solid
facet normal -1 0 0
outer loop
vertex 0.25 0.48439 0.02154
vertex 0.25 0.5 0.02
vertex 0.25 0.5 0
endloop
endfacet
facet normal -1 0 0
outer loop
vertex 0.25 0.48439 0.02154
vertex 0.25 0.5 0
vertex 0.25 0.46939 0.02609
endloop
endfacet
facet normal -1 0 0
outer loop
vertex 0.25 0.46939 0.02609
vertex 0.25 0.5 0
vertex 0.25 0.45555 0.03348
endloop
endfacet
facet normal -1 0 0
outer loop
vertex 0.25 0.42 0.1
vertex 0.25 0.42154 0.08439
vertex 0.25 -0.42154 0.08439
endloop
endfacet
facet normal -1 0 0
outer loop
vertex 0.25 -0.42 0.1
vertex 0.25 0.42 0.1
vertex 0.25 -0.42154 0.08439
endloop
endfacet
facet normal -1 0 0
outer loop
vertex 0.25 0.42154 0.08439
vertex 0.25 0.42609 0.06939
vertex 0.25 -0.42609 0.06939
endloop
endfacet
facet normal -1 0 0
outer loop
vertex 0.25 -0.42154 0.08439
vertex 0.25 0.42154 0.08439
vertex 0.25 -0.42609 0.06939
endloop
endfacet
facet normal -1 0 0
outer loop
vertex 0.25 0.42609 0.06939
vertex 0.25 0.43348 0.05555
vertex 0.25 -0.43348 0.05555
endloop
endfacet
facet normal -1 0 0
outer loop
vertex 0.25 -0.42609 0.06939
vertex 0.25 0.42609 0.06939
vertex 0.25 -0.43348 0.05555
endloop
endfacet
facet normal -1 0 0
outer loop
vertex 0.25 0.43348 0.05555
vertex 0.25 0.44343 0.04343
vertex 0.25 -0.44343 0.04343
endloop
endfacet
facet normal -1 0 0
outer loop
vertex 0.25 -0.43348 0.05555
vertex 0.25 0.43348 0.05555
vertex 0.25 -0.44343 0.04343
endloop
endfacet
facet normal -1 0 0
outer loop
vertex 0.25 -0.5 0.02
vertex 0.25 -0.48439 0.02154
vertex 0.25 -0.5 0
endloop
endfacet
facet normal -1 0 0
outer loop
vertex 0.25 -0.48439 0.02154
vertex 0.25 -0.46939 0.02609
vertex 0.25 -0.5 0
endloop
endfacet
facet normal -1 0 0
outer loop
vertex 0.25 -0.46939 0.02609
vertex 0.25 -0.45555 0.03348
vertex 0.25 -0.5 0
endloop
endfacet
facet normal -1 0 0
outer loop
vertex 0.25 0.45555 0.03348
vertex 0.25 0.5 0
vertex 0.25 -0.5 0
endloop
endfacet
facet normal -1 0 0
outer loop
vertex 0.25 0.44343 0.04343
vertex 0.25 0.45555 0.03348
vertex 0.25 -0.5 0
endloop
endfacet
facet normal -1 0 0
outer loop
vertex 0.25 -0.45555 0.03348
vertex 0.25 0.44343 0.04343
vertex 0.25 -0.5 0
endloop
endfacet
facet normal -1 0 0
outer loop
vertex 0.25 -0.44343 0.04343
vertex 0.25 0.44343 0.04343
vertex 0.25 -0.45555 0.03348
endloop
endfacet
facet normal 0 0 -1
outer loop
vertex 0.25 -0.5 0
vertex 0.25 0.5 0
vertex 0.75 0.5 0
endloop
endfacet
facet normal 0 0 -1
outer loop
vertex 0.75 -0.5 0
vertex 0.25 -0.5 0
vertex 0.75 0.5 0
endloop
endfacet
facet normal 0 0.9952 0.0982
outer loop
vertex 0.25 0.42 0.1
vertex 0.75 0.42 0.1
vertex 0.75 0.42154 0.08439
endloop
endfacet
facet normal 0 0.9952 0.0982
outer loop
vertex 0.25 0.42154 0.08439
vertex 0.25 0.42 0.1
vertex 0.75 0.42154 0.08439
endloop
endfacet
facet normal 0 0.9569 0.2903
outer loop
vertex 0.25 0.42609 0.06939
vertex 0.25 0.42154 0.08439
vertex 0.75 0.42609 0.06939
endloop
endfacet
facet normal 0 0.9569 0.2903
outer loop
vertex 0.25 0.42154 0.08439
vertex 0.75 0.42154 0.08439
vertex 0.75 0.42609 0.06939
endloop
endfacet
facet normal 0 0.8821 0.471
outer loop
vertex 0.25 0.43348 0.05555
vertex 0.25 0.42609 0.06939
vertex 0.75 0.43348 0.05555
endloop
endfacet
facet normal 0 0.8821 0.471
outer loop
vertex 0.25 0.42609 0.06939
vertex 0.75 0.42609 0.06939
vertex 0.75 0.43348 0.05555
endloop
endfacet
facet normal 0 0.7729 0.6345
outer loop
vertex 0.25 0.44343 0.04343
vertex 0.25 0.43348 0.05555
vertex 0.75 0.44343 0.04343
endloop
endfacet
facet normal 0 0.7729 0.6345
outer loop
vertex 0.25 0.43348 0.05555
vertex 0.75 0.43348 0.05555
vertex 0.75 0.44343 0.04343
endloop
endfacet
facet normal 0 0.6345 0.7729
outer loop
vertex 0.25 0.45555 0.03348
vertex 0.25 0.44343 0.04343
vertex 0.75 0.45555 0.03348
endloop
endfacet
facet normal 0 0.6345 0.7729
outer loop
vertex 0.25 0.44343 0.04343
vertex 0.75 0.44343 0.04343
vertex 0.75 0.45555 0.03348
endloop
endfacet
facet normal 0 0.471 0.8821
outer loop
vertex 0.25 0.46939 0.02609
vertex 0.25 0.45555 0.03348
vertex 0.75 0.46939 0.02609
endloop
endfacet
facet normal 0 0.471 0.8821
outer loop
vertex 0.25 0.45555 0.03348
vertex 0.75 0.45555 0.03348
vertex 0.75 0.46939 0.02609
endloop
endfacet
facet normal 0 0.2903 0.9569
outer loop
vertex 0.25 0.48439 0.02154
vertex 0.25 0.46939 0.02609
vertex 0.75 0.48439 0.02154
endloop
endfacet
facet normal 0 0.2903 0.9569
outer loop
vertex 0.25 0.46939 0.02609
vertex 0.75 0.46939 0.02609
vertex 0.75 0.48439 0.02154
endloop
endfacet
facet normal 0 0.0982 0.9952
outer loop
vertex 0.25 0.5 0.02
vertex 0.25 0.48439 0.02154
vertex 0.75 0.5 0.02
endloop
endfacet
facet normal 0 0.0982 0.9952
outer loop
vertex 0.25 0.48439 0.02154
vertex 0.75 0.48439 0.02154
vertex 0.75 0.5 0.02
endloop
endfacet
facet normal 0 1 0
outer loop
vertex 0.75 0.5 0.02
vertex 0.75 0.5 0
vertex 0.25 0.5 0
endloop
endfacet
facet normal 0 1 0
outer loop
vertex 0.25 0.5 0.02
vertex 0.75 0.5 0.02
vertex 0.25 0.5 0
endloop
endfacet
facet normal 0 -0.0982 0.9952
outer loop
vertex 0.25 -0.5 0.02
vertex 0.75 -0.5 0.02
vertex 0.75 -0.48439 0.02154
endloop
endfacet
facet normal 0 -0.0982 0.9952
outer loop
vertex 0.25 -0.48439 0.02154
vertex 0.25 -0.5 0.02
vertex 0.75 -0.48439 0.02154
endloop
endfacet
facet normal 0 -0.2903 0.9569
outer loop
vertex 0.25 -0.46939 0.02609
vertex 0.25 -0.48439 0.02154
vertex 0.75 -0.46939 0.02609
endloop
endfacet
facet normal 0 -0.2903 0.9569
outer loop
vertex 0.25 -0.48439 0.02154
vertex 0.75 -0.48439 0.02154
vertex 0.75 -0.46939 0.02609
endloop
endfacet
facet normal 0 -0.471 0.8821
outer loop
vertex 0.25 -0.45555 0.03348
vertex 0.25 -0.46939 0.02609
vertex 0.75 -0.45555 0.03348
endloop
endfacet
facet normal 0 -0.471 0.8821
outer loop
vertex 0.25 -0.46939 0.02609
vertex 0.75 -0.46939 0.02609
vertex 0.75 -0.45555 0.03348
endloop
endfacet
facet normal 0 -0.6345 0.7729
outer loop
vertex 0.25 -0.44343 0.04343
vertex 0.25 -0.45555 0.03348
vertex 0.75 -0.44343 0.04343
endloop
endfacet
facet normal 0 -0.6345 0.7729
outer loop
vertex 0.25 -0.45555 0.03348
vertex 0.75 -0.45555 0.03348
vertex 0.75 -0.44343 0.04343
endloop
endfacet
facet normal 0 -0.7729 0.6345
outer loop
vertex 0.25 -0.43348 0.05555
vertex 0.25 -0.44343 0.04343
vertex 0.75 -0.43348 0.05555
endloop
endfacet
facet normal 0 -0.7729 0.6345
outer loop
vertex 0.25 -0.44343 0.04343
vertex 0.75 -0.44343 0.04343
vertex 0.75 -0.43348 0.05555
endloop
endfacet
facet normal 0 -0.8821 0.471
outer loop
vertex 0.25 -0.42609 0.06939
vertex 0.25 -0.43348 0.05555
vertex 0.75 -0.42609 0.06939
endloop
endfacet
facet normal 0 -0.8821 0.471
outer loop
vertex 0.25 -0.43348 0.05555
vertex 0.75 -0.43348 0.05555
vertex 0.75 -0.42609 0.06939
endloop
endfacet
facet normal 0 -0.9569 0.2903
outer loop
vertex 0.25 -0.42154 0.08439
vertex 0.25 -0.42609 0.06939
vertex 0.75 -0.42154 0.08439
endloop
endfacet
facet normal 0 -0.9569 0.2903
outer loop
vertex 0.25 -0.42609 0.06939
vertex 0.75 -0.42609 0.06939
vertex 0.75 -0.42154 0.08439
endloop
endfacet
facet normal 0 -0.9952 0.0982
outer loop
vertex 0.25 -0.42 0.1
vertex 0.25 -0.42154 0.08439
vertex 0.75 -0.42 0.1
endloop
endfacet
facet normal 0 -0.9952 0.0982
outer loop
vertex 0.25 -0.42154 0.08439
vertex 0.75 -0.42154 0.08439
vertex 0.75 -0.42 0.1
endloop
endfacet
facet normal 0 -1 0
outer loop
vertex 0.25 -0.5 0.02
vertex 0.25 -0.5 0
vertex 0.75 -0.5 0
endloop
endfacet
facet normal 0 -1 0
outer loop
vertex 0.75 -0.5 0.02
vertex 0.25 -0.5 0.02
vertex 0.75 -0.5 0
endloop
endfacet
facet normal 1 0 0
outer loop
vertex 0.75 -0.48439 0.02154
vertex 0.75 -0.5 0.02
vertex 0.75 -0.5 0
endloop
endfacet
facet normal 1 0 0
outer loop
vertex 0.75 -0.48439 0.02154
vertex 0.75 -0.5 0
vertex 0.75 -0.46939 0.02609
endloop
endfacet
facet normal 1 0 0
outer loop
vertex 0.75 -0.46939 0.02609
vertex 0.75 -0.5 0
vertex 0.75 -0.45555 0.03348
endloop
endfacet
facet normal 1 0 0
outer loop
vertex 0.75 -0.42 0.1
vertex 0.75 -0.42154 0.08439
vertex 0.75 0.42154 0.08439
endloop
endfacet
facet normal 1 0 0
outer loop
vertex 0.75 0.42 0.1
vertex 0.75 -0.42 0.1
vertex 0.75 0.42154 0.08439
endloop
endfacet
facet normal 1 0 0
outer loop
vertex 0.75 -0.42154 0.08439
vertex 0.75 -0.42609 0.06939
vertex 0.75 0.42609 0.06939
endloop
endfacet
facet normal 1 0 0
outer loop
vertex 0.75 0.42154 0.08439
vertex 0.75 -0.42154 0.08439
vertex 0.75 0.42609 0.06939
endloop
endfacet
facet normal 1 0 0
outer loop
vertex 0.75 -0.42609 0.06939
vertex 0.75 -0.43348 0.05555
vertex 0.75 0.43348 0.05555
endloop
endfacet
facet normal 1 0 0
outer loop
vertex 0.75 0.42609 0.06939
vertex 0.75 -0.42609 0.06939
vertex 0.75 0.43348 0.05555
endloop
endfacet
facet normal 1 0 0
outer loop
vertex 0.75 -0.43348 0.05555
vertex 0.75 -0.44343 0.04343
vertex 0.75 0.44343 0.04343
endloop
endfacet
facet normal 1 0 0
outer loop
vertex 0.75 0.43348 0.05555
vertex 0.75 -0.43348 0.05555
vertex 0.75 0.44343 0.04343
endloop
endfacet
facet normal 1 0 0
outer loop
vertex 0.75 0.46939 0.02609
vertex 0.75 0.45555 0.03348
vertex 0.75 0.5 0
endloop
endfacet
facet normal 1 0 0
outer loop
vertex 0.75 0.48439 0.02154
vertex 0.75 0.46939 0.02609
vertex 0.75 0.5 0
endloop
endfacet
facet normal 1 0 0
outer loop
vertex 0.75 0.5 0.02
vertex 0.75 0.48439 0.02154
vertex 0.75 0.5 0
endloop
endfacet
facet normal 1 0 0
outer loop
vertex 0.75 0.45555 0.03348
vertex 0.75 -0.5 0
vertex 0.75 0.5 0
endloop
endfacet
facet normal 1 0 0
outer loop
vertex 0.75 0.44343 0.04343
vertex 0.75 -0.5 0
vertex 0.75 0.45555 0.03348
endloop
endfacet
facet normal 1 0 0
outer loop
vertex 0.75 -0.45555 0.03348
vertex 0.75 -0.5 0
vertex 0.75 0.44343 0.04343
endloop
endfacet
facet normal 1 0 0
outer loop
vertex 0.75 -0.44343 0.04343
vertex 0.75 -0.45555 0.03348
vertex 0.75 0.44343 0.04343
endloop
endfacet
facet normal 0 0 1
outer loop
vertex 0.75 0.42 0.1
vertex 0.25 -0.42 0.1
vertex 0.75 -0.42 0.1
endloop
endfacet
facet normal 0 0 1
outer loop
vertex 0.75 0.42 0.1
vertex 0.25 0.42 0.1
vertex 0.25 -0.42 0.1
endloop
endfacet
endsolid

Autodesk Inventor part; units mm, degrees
ref_plane "YZ Plane" through (0, 0, 0) normal (1, 0, 0) x (0, 1, 0)
ref_plane "XZ Plane" through (0, 0, 0) normal (0, 1, 0) x (-1, 0, 0)
ref_plane "XY Plane" through (0, 0, 0) normal (0, 0, 1) x (1, 0, 0)
sketch "스케치1" plane through (0, 0, 0) normal (0, 0, 1) x (1, 0, 0)
  line L0 (-0.15, 0) -> (0.9, 0) construction
  line L1 (0, -0.7) -> (0, 0.7) construction
  line L2 (0.25, -0.5) -> (0.75, -0.5)
  line L3 (0.75, -0.5) -> (0.75, 0.5)
  line L4 (0.75, 0.5) -> (0.25, 0.5)
  line L5 (0.25, 0.5) -> (0.25, -0.5)
  point P0 (0, 0)
  point P1 (0.5, -0.5)
  dimension "d7" = 0.5
  dimension "d8" = 1
  dimension "d9" = 0.25
extrude "돌출1" add sketch "스케치1" along normal blind 0.1
sketch "스케치3" plane through (0.25, 0.5, 0) normal (0, 1, 0) x (1, 0, 0)
  line L0 (-0.25, 0.7571) -> (-0.25, -0.2929) construction
  line L1 (-0.4, 0) -> (0.65, 0) construction
  line L2 (0.5, 0) -> (0, 0) projected
  line L3 (0, 0) -> (0, -0.1) projected
  line L4 (0.5, -0.1) -> (0, -0.1) projected
  line L5 (0.5, 0) -> (0.5, -0.1) projected
  arc A0 (0, -0.1) -> (0.5, -0.1) centre (0.25, 0.6071) ccw
  line L6 (0.25, -0.1) -> (0.25, 0.4799) construction
  point P0 (-0.25, 0)
  dimension "d10" = 0.75
sketch "스케치5" plane through (0, 0, 0.1) normal (0, 0, 1) x (1, 0, 0)
  line L0 (0.75, -0.5) -> (0.75, 0.5) projected
  line L1 (0.75, 0.5) -> (0.25, 0.5) projected
  line L2 (0.25, 0.5) -> (0.25, -0.5) projected
  line L3 (0.25, -0.5) -> (0.75, -0.5) projected
  line L4 (-0.15, 0) -> (0.9, 0) construction
  line L5 (0, -0.7) -> (0, 0.7) construction
  line L6 (-0.15, 0) -> (0.9, 0) construction
  line L7 (0, 0.7) -> (0, -0.7) construction
  line L8 (0.75, 0.4) -> (0.25, 0.4)
  line L9 (0.75, -0.4) -> (0.25, -0.4)
  point P0 (0, 0)
  dimension "d18" = 1
  dimension "d19" = 0.4
sketch "스케치6" plane through (0.75, -0.5, 0) normal (1, 0, 0) x (0, 0, -1)
  line L0 (0, 0) -> (0, 1) projected
  line L1 (0, 1) -> (-0.1, 1) projected
  line L2 (-0.1, 0) -> (-0.1, 1) projected
  line L3 (0, 0) -> (-0.1, 0) projected
  line L4 (0, 0.5) -> (-0.1, 0.5) construction
  line L5 (0, 0.92) -> (-0.1, 0.92)
  arc A0 (-0.1, 0.92) -> (-0.02, 1) centre (-0.1, 1) ccw
  arc A1 (-0.02, 0) -> (-0.1, 0.08) centre (-0.1, 0) ccw
  point P0 (-0.05, 0.5)
  point P1 (-0.05, 0.92)
  point P2 (-0.02, 0)
  point P3 (-0.1, 0.08)
  dimension "d20" = 0.42
extrude "돌출5" cut sketch "스케치6" against normal up to surface (0.5 mm away) contours L3 L2 A1 | L2 L1 A0
sketch "스케치7" plane through (0.75, -0.5, 0) normal (1, 0, 0) x (0, 0, -1)
  arc A0 (-0.1, 0.92) -> (-0.02, 1) centre (-0.1, 1) ccw projected
  line L0 (-0.1, 0.08) -> (-0.1, 0.92) projected
  arc A1 (-0.02, 0) -> (-0.1, 0.08) centre (-0.1, 0) ccw projected
  line L1 (0, 0) -> (-0.02, 0) projected
  line L2 (0, 0) -> (0, 1) projected
  line L3 (0, 1) -> (-0.02, 1) projected
  line L4 (0, 0.5) -> (-0.2526, 0.5) construction
  line L5 (-0.2526, 0.5) -> (-0.2526, 0.9) construction
  line L6 (-0.2526, 0.9) -> (-0.1, 0.9) construction
  line L7 (-0.2526, 0.1) -> (-0.1, 0.1) construction
  dimension "d23" = 0.4
properties part number "flat_surface_1"
